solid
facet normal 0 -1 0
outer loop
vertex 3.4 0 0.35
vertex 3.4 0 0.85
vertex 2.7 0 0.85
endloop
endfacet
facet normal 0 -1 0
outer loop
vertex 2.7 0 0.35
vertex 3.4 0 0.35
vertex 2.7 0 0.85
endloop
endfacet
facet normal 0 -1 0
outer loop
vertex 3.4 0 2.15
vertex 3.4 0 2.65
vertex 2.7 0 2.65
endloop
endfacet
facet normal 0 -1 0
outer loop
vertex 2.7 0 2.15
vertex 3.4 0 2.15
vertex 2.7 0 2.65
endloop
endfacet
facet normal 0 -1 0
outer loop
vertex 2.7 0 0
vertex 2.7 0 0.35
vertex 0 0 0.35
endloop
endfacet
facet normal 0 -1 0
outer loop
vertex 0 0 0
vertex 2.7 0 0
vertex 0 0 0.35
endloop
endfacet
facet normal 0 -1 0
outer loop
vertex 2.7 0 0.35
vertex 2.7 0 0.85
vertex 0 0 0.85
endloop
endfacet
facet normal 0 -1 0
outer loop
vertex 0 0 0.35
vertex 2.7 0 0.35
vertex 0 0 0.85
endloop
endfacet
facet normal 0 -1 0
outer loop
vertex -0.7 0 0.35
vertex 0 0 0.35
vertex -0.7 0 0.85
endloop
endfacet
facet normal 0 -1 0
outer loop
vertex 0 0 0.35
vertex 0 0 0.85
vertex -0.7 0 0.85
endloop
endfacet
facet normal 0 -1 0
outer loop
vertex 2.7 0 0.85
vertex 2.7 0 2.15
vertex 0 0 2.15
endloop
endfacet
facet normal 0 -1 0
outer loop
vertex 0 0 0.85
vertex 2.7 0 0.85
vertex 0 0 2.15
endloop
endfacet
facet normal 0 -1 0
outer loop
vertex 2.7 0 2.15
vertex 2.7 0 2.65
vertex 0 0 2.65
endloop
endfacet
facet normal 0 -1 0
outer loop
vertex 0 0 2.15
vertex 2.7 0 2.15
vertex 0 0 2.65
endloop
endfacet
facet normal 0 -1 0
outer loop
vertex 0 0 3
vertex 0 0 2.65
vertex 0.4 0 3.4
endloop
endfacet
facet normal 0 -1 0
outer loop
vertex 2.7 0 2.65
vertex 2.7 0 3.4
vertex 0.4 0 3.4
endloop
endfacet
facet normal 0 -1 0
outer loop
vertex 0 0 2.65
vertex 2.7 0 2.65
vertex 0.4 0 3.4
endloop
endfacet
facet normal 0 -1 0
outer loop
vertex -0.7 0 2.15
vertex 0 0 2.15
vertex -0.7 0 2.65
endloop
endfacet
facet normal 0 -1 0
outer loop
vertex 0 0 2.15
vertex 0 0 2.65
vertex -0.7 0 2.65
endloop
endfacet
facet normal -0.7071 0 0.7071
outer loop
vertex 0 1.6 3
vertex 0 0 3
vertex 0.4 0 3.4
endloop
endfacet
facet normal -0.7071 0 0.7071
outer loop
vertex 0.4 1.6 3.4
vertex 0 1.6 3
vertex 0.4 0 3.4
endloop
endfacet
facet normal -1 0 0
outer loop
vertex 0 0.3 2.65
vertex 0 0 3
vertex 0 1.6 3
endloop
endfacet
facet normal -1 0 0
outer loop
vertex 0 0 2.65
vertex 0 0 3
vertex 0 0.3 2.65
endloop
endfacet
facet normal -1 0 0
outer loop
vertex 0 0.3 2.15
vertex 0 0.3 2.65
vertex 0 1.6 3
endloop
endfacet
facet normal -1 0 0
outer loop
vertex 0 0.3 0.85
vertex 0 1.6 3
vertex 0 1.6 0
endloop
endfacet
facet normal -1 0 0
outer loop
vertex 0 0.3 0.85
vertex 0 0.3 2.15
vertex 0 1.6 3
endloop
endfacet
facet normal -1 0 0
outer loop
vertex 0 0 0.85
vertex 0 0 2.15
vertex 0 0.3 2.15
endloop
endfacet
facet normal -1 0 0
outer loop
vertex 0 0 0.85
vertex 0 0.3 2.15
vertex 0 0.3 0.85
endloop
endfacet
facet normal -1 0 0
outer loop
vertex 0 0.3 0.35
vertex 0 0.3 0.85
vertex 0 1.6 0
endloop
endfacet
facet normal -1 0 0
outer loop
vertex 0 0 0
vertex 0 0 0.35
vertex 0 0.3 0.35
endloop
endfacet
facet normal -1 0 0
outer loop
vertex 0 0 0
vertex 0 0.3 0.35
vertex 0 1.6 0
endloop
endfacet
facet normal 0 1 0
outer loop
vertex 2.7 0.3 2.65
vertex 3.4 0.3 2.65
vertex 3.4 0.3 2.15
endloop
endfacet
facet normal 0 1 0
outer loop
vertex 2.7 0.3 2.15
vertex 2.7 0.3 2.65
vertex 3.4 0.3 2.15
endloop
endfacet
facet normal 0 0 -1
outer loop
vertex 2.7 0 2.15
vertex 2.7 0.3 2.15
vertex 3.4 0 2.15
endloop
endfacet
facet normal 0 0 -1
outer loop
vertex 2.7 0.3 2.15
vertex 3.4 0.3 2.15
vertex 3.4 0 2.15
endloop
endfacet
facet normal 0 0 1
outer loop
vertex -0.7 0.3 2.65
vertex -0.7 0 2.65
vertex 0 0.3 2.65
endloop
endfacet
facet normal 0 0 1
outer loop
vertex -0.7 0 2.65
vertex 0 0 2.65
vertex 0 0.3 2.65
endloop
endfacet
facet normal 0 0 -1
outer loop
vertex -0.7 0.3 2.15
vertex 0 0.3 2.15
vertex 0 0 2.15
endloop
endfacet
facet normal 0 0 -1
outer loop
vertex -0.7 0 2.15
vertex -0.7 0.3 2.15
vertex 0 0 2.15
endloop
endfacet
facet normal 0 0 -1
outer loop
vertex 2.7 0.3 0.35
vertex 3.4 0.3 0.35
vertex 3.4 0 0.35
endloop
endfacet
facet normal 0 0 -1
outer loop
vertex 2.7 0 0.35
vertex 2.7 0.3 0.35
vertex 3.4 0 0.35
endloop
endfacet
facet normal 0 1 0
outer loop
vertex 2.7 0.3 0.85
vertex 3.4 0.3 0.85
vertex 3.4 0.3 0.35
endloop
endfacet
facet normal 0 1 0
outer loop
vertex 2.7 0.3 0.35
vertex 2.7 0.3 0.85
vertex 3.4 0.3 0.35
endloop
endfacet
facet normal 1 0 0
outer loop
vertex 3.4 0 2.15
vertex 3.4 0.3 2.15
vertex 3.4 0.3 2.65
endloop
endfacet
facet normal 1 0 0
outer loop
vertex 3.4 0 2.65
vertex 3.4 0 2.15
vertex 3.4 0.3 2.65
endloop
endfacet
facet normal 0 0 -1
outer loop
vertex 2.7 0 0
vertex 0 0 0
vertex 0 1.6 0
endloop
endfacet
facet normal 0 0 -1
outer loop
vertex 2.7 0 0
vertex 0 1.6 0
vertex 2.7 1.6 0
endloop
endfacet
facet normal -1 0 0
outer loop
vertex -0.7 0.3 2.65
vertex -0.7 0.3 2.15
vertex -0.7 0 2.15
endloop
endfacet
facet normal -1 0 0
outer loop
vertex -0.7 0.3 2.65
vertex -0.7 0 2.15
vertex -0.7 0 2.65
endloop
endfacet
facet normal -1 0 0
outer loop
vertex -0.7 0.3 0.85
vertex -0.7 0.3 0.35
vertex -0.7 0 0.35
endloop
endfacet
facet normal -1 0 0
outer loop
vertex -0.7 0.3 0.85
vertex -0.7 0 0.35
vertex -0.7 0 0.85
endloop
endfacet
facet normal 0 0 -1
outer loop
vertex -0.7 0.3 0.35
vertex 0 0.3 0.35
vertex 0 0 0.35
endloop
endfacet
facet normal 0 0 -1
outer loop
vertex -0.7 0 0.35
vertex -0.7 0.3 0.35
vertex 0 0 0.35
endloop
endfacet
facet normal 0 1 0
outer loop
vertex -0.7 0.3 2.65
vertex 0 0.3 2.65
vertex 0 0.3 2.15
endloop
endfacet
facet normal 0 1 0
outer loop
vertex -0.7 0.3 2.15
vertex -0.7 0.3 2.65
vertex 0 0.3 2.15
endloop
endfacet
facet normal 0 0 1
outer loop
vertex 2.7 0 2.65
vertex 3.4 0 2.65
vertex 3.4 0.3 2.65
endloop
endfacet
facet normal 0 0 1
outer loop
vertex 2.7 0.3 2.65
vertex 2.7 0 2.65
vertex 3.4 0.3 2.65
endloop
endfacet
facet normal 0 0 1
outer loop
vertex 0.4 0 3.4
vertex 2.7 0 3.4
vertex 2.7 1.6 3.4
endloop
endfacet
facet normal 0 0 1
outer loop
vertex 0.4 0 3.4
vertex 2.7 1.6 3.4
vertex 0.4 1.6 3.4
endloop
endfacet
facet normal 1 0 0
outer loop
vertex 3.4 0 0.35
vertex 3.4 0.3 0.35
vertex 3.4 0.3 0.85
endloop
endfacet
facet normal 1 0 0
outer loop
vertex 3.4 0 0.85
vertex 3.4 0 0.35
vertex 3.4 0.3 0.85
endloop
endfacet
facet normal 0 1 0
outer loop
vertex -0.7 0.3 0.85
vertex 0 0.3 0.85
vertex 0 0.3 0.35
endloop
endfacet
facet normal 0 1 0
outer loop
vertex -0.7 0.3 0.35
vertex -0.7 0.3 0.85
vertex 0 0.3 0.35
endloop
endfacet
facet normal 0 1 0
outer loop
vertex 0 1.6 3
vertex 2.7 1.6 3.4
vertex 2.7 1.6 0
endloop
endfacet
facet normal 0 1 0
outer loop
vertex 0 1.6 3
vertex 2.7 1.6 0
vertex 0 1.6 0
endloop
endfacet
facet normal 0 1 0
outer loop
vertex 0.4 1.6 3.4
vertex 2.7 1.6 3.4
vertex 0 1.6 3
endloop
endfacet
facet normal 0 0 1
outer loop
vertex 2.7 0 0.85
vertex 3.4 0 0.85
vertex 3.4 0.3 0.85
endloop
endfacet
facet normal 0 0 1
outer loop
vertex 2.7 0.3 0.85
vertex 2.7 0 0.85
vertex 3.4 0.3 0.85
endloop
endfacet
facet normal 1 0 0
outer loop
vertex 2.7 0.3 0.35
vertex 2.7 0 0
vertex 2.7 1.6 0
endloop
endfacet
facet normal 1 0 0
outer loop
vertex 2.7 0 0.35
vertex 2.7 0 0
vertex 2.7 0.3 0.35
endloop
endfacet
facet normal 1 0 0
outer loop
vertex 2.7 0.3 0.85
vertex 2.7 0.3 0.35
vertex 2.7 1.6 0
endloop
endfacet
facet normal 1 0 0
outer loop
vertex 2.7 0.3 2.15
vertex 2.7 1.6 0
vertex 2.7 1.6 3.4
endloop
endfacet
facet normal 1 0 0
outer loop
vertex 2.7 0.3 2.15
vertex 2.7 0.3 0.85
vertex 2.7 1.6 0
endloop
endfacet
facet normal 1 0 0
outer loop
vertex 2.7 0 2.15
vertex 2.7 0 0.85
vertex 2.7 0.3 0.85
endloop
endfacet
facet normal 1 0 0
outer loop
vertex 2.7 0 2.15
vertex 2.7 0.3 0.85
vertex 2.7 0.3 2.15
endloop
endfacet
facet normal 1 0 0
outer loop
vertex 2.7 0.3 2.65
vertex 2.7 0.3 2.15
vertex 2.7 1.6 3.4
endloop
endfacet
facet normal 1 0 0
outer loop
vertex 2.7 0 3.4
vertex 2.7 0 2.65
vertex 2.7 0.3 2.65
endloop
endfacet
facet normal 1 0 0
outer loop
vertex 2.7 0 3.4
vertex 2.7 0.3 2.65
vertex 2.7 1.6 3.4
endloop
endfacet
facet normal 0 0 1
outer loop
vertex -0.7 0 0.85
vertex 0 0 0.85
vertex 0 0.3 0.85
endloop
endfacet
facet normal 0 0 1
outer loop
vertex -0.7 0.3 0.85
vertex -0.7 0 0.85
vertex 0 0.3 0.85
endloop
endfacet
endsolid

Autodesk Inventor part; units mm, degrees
ref_plane "YZ Plane" through (0, 0, 0) normal (1, 0, 0) x (0, 1, 0)
ref_plane "XZ Plane" through (0, 0, 0) normal (0, 1, 0) x (-1, 0, 0)
ref_plane "XY Plane" through (0, 0, 0) normal (0, 0, 1) x (1, 0, 0)
sketch "Sketch1" plane through (0, 0, 0) normal (0, 1, 0) x (-1, 0, 0)
  line L0 (0, 0) -> (-2.7, 0)
  line L1 (-2.7, 0) -> (-2.7, 3.4)
  line L2 (-2.7, 3.4) -> (-0.4, 3.4)
  line L3 (0, 3) -> (0, 0)
  line L4 (0, 3) -> (-0.4, 3.4)
  dimension "QRE1113GR_x" = 2.7
  dimension "QRE1113GR_y" = 3.4
  dimension "d2" = 45
  dimension "d3" = 2.3
extrude "Extrusion1" add sketch "Sketch1" along normal blind 1.6
sketch "Sketch2" plane through (0, 0, 0) normal (-1, 0, 0) x (0, 0, 1)
  line L0 (3, 0) -> (0, 0) projected
  line L1 (0.35, 0) -> (0.85, 0)
  line L2 (0.85, 0) -> (0.85, 0.3)
  line L3 (0.85, 0.3) -> (0.35, 0.3)
  line L4 (0.35, 0.3) -> (0.35, 0)
  line L5 (2.15, 0) -> (2.65, 0)
  line L6 (0, 1.6) -> (3, 1.6) projected
  line L7 (1.5, 1.6) -> (1.5, 0)
  line L8 (0.6, 0.3) -> (0.6, 0)
  dimension "d6" = 0.5
  dimension "d7" = 0.3
  dimension "d8" = 0.9
extrude "Extrusion2" add sketch "Sketch2" along normal blind 0.7
pattern_linear "Rectangular Pattern1" count 2 spacing 1.8 along (0, 0, 1) count 2 spacing 3.4 along (1, 0, 0) of "Extrusion2"
properties part number "QRE1113GR"
